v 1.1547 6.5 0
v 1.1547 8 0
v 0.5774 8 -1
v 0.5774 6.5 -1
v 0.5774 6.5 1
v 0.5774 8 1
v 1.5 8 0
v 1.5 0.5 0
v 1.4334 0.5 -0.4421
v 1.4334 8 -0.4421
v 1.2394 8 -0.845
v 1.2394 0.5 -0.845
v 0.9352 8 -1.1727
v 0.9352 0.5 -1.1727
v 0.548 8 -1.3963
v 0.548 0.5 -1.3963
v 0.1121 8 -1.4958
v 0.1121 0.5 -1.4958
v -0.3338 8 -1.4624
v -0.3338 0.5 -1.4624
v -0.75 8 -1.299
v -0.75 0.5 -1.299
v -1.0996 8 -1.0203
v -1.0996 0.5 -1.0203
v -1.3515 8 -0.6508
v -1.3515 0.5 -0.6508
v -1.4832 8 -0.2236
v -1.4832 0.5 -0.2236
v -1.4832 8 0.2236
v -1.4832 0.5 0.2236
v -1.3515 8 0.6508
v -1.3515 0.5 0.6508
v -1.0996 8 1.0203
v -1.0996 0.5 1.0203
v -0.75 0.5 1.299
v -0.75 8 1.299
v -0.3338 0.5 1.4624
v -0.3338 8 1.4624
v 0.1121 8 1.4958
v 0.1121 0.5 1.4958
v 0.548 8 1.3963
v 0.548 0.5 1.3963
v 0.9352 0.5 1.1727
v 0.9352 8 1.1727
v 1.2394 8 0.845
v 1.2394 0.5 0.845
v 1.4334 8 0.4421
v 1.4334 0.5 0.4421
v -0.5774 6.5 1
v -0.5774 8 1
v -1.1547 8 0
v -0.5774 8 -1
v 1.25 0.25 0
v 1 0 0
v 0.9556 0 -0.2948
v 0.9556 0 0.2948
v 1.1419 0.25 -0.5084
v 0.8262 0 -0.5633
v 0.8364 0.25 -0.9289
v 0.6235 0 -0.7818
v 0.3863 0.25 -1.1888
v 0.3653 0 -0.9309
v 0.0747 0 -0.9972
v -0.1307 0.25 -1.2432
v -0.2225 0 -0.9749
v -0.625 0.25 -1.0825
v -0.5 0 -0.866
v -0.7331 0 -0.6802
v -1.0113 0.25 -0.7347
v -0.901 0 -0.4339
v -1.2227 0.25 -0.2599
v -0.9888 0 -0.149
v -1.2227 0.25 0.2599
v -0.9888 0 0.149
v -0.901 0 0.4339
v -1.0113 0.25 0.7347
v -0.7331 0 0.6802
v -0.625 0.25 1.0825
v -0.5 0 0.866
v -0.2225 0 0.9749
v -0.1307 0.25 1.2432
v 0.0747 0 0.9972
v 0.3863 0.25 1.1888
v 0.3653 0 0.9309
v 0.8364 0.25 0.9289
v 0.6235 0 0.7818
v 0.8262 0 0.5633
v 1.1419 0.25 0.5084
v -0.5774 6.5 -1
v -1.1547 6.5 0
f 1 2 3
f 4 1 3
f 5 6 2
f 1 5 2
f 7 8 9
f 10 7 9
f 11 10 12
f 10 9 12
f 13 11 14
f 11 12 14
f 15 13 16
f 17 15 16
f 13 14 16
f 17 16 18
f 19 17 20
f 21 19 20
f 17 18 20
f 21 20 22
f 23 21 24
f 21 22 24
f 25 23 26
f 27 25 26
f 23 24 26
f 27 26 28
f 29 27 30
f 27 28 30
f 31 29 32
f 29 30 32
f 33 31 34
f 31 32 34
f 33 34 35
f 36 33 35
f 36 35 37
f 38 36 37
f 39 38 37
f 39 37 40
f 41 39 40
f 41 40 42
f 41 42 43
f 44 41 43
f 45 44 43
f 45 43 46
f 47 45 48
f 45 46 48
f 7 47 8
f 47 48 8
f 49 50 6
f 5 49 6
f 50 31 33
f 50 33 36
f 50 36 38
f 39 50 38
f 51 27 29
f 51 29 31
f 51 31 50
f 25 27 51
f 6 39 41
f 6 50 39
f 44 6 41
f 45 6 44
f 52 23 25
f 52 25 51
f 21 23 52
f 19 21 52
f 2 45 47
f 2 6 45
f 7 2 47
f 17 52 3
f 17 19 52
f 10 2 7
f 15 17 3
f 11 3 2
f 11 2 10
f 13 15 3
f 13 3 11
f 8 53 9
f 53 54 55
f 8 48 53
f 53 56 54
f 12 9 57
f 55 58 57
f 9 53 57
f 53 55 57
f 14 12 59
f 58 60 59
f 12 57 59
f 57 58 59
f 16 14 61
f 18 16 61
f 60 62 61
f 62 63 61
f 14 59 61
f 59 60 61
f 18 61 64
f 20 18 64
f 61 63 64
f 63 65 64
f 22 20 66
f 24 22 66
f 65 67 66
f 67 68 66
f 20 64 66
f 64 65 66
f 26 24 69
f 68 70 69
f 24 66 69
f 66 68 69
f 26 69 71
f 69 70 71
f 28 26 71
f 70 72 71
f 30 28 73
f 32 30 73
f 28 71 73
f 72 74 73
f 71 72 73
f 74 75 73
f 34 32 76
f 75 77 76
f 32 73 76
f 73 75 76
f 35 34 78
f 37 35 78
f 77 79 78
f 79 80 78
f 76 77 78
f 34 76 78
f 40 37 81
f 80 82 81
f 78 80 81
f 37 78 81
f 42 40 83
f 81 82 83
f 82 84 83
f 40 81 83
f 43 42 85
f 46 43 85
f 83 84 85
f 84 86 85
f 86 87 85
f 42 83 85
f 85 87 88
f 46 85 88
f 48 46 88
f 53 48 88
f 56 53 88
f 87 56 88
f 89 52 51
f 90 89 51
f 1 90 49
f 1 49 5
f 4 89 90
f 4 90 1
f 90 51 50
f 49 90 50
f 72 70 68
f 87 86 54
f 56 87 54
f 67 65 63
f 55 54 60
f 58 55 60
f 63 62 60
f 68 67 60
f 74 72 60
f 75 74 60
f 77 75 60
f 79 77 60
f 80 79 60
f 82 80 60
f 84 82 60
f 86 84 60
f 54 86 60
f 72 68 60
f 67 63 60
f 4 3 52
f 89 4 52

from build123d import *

# Parameters (mm, degrees)
SKETCH1_R           = 1.5
BOSS_EXTRUDE1_DEPTH = 8
CHAMFER1_SIZE       = 0.5
CUT_EXTRUDE1_DEPTH  = 1.5


with BuildPart() as part:
    # Sketch1 → Boss-Extrude1 (new body)
    with BuildSketch(Plane(origin=(0, 0, 0), x_dir=(1, 0, 0), z_dir=(0, 1, 0))):
        Circle(SKETCH1_R)
    extrude(amount=BOSS_EXTRUDE1_DEPTH)

    # Chamfer1
    chamfer1_edges = [part.edges().sort_by_distance(p)[0] for p in [
        (-1.5, 0, 0),
    ]]
    chamfer(chamfer1_edges, length=CHAMFER1_SIZE)

    # Sketch2 → Cut-Extrude1 (cut)
    with BuildSketch(Plane(origin=(0, 8, 0), x_dir=(1, 0, 0), z_dir=(0, 1, 0))):
        Polygon((0.577350269, -1), (1.154700538, 0), (0.577350269, 1), (-0.577350269, 1), (-1.154700538, 0), (-0.577350269, -1), align=None)
    extrude(amount=-CUT_EXTRUDE1_DEPTH, mode=Mode.SUBTRACT)


solid = part.part
